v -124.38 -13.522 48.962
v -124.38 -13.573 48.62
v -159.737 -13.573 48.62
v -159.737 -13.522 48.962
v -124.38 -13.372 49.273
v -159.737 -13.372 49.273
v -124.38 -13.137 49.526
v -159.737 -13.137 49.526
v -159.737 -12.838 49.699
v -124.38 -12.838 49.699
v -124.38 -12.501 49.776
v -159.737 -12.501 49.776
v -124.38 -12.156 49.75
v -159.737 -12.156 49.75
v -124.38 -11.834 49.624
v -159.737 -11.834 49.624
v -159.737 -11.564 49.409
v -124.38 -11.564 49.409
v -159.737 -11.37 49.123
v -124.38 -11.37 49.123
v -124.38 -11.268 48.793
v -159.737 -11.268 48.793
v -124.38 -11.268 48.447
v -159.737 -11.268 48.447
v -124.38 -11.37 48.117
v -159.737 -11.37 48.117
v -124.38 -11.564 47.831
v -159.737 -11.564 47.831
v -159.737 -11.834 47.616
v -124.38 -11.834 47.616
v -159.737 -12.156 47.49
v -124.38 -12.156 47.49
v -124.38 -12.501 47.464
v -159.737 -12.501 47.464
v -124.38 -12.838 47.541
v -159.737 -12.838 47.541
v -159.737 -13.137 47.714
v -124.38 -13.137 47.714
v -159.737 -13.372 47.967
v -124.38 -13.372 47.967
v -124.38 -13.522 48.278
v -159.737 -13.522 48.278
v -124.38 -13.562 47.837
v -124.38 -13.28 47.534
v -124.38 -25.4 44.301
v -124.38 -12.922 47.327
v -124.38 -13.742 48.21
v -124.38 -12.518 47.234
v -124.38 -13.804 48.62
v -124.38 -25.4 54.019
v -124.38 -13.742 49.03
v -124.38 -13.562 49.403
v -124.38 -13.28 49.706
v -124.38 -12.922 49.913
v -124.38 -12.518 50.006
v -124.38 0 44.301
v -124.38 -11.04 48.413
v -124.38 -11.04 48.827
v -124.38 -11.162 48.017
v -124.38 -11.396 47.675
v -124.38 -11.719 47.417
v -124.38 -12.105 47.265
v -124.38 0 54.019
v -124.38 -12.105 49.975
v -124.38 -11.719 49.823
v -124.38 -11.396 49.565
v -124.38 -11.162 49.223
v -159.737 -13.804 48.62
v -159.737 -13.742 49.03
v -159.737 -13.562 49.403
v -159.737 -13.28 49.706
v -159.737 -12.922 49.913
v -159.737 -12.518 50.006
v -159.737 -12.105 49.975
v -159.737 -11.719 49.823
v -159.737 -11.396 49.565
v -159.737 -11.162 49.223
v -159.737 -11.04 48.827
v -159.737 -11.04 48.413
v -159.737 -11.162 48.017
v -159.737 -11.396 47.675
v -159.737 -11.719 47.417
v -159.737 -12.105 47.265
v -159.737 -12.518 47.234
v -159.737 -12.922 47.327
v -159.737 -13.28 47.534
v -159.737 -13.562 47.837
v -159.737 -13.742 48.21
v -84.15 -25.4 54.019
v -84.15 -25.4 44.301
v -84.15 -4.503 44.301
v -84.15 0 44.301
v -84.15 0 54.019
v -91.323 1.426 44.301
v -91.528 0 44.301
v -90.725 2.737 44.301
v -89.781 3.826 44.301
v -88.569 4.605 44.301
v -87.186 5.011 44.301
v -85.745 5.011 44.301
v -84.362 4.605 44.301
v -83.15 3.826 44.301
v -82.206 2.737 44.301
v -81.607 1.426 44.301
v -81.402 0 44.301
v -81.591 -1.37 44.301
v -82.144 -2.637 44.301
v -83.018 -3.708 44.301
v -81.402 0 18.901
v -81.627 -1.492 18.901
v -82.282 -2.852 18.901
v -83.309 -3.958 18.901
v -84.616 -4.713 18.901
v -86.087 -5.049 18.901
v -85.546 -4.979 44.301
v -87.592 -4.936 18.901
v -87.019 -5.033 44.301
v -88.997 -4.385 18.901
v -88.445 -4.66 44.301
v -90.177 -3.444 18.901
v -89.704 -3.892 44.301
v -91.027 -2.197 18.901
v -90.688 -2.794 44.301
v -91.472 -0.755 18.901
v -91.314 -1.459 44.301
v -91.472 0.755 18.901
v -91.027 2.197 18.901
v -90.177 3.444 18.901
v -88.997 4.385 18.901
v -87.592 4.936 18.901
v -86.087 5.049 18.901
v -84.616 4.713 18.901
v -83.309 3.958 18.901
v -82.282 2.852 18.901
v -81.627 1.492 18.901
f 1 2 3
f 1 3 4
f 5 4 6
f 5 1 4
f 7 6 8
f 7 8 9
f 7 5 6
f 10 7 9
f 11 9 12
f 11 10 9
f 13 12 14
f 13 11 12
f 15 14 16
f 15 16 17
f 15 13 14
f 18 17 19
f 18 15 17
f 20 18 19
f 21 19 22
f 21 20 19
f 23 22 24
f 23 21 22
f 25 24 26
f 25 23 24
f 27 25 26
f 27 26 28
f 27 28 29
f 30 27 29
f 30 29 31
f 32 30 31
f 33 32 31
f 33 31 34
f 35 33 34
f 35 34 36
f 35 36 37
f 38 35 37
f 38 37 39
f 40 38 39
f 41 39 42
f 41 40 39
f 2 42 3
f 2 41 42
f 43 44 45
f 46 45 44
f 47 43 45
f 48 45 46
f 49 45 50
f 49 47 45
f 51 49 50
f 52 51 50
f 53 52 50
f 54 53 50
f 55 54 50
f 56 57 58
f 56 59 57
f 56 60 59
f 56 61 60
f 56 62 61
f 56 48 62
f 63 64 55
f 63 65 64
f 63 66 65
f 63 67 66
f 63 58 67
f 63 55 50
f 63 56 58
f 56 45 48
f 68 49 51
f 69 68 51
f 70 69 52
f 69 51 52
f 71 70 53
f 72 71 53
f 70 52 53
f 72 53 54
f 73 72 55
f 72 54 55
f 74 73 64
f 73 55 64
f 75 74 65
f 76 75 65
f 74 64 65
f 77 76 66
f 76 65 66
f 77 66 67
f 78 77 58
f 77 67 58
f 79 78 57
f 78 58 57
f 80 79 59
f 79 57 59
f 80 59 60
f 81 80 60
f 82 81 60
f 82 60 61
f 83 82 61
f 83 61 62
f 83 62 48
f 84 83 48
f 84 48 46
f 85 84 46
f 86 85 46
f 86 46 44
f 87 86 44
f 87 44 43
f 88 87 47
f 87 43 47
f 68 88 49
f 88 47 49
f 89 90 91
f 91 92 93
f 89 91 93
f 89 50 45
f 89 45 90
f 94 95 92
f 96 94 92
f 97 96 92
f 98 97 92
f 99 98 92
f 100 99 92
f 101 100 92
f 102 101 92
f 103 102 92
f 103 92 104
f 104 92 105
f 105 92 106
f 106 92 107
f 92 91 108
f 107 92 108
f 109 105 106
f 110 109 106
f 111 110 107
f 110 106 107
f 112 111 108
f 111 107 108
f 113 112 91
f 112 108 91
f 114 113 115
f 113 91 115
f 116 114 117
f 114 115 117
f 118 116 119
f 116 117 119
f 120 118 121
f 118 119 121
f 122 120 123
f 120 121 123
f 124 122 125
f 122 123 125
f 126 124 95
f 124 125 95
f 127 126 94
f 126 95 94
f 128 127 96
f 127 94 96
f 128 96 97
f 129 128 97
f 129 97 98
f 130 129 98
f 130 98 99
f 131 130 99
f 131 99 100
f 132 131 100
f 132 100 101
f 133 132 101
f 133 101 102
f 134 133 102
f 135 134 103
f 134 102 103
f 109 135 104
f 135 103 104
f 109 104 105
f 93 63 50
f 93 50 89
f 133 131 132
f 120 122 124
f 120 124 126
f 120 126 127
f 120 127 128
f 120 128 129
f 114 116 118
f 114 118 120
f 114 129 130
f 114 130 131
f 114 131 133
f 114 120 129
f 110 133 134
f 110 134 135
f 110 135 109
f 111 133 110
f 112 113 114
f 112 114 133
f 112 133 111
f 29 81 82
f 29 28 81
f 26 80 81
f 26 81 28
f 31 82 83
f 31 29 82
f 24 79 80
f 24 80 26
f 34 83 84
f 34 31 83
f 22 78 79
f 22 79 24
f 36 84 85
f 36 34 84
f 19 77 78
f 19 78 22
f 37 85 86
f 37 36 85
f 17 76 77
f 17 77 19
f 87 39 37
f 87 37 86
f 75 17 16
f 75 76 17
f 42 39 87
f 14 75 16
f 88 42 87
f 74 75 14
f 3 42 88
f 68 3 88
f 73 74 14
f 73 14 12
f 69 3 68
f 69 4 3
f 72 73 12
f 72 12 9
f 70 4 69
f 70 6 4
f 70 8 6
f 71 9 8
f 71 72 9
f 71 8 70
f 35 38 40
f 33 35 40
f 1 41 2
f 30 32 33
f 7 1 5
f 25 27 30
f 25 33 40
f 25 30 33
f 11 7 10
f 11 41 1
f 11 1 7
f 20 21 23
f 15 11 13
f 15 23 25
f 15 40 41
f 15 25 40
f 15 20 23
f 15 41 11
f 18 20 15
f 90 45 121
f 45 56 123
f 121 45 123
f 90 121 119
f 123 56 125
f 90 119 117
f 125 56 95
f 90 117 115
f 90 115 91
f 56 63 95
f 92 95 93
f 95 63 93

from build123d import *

# Parameters (mm, degrees)
F0_W     = 40.230050683
F0_H     = 9.7180828452
F1_DEPTH = 25.4
F2_R     = 1.3894743623
F2_R_2   = 1.1592895912
F3_DEPTH = 35.3568
F4_R     = 5.0629514974
F5_DEPTH = 25.4


with BuildPart() as f1:
    # F0 (on Front) → F1 (new body)
    with BuildSketch(Plane.XZ):
        with Locations((-104.2651683092, 49.1601750255)):
            Rectangle(F0_W, F0_H)
    extrude(amount=F1_DEPTH)

    # F2 (on face) → F3 (join)
    with BuildSketch(Plane(origin=(-124.3801936507, 0, 0), x_dir=(0, -1, 0), z_dir=(-1, 0, 0))):
        with Locations((12.4141043052, 48.6199855804)):
            Circle(F2_R)
        with Locations((12.4141043052, 48.6199855804)):
            Circle(F2_R_2, mode=Mode.SUBTRACT)
    extrude(amount=F3_DEPTH)

    # F4 (on face) → F5 (join)
    with BuildSketch(Plane(origin=(0, 0, 44.3011336029), x_dir=(1, 0, 0), z_dir=(0, 0, -1))):
        with Locations((-86.4652916789, 0)):
            Circle(F4_R)
    extrude(amount=F5_DEPTH)


solid = f1.part
